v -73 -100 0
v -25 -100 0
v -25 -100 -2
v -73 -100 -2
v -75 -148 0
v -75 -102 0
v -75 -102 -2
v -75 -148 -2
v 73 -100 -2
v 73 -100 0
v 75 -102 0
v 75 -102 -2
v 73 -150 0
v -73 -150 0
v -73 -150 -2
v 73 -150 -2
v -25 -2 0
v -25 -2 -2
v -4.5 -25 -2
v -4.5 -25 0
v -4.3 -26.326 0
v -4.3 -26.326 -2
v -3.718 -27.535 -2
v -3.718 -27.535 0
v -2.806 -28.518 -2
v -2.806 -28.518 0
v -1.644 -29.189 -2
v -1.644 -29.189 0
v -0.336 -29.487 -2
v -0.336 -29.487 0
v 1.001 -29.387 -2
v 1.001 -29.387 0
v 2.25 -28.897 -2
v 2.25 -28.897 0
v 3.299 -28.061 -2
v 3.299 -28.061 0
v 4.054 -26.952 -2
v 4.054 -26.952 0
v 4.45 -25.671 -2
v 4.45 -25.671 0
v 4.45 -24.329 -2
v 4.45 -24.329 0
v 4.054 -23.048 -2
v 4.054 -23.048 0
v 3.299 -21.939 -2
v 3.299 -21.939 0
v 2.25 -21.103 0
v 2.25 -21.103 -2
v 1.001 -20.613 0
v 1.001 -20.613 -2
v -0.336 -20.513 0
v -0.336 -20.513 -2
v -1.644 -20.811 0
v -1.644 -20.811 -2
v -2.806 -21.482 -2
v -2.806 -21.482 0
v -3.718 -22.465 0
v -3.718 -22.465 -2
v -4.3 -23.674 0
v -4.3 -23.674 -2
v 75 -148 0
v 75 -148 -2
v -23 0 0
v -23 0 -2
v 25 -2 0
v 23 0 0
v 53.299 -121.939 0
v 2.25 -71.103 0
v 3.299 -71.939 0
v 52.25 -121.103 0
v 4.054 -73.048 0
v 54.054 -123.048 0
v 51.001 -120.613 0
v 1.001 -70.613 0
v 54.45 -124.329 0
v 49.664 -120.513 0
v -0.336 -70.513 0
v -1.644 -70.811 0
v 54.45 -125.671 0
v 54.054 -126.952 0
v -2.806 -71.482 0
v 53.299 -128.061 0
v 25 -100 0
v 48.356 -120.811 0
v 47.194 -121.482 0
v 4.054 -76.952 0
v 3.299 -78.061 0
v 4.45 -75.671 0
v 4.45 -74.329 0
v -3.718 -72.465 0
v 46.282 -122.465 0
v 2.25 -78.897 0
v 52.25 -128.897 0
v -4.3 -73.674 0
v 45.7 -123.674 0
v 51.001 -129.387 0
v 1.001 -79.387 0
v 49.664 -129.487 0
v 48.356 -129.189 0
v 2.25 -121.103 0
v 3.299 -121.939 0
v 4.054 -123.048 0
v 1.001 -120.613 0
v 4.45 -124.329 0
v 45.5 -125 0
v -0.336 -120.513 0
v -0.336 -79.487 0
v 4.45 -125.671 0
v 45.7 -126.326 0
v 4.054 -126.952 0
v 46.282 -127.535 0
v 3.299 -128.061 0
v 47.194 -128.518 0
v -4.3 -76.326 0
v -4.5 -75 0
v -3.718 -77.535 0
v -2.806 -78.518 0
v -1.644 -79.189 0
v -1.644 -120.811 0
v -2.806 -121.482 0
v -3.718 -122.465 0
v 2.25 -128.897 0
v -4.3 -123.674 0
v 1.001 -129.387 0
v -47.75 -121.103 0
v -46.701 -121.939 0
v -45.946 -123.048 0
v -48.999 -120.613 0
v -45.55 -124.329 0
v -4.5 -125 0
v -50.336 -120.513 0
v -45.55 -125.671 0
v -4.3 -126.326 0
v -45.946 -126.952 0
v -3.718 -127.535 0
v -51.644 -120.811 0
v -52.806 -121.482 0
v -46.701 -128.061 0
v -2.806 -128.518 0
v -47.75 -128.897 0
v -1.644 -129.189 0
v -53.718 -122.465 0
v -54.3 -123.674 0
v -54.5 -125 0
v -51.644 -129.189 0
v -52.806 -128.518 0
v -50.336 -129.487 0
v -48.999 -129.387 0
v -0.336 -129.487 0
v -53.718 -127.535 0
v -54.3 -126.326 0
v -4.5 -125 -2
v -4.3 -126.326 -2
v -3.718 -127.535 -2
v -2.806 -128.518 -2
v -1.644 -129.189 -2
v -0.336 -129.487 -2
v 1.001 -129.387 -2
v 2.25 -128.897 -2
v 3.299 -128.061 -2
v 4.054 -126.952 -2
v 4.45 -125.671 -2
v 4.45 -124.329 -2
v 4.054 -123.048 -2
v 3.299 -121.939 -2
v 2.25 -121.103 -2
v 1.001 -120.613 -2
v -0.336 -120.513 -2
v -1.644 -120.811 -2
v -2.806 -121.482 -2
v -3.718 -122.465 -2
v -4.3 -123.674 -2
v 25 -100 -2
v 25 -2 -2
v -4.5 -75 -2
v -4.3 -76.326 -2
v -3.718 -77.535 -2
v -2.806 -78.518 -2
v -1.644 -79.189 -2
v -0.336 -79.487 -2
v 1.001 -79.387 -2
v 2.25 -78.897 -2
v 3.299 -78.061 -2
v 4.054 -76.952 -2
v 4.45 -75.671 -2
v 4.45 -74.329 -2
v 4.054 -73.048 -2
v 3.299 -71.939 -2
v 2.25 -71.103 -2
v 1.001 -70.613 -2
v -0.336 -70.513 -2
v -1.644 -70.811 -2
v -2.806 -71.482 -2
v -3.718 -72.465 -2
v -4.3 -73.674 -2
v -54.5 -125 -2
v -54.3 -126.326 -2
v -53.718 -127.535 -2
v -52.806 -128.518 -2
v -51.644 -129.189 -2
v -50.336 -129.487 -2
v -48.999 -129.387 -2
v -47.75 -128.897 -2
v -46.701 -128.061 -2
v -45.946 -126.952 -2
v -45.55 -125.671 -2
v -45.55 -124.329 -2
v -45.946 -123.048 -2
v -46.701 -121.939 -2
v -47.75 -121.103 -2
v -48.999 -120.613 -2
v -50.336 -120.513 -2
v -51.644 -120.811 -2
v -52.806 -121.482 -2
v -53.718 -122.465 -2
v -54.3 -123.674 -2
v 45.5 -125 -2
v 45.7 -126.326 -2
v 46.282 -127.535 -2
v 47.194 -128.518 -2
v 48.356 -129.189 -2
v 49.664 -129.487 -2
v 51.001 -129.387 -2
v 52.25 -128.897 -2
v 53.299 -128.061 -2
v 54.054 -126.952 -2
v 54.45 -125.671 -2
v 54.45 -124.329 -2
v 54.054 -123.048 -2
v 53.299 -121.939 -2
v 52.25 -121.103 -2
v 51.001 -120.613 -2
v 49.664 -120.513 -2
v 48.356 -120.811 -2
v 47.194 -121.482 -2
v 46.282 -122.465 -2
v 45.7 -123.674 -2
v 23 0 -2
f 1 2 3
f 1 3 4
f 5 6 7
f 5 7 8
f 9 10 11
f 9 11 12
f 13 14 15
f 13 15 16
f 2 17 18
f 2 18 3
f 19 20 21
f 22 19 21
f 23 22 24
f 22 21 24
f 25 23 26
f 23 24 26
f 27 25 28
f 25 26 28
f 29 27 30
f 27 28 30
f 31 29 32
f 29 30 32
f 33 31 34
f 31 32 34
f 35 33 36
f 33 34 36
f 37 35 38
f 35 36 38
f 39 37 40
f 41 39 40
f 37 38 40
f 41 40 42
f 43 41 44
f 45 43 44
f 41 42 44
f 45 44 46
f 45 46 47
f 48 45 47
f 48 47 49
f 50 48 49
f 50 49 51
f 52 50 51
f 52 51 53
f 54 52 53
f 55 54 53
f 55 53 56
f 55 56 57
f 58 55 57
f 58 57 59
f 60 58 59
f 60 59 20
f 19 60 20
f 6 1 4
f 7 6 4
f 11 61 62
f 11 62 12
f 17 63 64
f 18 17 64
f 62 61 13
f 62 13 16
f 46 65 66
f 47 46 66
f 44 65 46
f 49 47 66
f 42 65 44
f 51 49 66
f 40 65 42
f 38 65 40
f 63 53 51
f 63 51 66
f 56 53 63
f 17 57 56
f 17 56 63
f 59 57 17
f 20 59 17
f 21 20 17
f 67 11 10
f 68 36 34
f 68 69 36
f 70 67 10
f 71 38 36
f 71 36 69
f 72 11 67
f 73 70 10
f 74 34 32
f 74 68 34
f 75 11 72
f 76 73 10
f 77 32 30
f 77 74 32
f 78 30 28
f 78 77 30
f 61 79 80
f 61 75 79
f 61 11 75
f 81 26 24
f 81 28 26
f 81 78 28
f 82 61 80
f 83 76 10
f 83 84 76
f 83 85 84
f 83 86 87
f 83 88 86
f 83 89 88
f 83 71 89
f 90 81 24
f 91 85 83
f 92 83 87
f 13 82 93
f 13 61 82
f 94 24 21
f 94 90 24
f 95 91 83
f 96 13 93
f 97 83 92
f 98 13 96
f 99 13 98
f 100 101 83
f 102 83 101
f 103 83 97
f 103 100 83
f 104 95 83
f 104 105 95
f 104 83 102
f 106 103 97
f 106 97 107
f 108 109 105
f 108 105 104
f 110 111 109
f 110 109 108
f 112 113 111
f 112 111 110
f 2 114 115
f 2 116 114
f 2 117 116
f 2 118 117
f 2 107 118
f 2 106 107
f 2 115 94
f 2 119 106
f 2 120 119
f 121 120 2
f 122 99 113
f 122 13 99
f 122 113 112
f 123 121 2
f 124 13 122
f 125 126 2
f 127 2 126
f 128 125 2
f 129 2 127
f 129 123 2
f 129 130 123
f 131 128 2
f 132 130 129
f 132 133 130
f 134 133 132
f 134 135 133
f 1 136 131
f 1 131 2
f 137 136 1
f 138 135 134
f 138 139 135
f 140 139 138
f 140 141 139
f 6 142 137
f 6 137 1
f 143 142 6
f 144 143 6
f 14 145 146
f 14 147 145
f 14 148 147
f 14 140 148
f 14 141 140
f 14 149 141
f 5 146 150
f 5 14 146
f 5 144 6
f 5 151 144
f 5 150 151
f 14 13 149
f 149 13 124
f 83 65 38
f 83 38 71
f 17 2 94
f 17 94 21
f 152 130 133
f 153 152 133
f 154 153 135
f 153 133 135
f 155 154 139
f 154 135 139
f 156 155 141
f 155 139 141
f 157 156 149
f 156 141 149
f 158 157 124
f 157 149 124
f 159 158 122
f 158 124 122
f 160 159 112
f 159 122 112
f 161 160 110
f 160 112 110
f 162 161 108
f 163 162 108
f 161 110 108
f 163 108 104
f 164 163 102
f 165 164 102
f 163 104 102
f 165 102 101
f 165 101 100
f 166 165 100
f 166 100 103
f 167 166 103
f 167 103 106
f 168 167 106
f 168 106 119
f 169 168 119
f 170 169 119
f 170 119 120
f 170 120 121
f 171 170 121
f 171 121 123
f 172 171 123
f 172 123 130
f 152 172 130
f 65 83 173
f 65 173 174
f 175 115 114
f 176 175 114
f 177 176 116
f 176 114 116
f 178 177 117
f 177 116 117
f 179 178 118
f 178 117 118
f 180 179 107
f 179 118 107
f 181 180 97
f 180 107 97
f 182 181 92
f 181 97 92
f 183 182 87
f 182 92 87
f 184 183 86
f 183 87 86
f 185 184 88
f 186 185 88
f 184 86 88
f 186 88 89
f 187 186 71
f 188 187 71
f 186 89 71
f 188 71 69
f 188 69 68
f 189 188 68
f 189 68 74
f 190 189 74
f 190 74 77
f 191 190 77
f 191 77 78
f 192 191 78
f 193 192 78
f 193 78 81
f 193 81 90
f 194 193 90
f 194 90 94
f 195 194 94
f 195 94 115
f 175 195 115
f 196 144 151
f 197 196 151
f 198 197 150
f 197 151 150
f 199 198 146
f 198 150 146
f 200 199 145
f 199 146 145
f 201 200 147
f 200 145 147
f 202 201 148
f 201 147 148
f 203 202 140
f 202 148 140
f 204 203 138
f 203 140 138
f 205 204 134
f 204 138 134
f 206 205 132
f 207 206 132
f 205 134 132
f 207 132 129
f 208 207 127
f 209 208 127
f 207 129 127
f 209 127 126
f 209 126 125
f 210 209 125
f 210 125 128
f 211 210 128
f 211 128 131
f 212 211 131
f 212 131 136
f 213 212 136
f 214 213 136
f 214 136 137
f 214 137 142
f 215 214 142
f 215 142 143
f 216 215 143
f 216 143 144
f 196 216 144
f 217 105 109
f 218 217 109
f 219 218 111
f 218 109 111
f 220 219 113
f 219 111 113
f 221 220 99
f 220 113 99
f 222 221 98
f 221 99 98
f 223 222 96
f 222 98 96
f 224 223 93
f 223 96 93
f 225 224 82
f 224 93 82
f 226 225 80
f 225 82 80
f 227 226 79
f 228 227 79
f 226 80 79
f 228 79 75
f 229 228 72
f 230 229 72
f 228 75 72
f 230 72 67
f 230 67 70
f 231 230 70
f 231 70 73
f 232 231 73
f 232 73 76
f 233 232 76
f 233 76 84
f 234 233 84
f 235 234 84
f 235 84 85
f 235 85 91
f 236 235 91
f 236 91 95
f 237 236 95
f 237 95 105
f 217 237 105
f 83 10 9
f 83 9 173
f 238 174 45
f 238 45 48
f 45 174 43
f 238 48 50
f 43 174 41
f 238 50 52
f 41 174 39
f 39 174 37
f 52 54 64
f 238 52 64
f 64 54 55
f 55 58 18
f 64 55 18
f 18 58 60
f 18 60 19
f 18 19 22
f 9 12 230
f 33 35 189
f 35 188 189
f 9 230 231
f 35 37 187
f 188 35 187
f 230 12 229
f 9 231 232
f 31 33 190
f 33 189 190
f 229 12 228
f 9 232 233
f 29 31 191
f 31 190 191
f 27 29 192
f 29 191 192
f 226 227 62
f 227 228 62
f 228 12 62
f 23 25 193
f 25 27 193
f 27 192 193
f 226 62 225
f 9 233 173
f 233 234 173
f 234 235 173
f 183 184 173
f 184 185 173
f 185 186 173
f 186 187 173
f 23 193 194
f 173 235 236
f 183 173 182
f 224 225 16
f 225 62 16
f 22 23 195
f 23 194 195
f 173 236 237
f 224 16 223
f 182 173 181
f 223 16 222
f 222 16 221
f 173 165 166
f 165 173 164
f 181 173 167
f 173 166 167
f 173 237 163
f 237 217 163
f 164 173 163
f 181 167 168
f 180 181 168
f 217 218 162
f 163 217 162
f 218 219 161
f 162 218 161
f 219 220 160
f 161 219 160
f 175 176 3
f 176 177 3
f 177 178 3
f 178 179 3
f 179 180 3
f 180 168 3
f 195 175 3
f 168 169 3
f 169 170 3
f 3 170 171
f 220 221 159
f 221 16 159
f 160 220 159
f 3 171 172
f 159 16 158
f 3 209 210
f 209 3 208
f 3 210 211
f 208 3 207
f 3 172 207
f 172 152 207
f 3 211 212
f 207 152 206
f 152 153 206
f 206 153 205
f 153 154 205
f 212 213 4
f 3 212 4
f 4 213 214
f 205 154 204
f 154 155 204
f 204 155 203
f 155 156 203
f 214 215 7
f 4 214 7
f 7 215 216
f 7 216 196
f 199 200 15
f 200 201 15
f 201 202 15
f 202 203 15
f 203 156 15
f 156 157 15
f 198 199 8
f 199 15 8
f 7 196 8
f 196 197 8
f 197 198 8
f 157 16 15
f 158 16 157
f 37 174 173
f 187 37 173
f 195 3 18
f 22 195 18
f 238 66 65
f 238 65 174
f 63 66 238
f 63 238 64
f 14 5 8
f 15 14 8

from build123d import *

# Parameters (mm, degrees)
EXTRUDE_1_DEPTH   = 2
HOLE_WIZARD_M81_D = 9
CHAMFER_1_SIZE    = 2


with BuildPart() as part:
    # Эскиз1 → Бобышка-Вытянуть1 (new body)
    with BuildSketch(Plane(origin=(0, 0, 0), x_dir=(1, 0, 0), z_dir=(0, 0, -1))):
        Polygon((-75, 150), (75, 150), (75, 100), (25, 100), (25, 0), (-25, 0), (-25, 100), (-75, 100), align=None)
    extrude(amount=EXTRUDE_1_DEPTH)

    # Отверстие с зазором M81 (through all)
    with Locations(Plane(origin=(0, 0, -2), x_dir=(1, 0, 0), z_dir=(0, 0, -1))):
        with Locations((0, 25), (0, 125), (-50, 125), (50, 125), (0, 75)):
            Hole(HOLE_WIZARD_M81_D / 2)

    # Фаска1
    chamfer_1_edges = [part.edges().sort_by_distance(p)[0] for p in [
        (-75, -100, -1),
        (-75, -150, -1),
        (75, -150, -1),
        (75, -100, -1),
        (25, 0, -1),
        (-25, 0, -1),
    ]]
    chamfer(chamfer_1_edges, length=CHAMFER_1_SIZE)


solid = part.part
